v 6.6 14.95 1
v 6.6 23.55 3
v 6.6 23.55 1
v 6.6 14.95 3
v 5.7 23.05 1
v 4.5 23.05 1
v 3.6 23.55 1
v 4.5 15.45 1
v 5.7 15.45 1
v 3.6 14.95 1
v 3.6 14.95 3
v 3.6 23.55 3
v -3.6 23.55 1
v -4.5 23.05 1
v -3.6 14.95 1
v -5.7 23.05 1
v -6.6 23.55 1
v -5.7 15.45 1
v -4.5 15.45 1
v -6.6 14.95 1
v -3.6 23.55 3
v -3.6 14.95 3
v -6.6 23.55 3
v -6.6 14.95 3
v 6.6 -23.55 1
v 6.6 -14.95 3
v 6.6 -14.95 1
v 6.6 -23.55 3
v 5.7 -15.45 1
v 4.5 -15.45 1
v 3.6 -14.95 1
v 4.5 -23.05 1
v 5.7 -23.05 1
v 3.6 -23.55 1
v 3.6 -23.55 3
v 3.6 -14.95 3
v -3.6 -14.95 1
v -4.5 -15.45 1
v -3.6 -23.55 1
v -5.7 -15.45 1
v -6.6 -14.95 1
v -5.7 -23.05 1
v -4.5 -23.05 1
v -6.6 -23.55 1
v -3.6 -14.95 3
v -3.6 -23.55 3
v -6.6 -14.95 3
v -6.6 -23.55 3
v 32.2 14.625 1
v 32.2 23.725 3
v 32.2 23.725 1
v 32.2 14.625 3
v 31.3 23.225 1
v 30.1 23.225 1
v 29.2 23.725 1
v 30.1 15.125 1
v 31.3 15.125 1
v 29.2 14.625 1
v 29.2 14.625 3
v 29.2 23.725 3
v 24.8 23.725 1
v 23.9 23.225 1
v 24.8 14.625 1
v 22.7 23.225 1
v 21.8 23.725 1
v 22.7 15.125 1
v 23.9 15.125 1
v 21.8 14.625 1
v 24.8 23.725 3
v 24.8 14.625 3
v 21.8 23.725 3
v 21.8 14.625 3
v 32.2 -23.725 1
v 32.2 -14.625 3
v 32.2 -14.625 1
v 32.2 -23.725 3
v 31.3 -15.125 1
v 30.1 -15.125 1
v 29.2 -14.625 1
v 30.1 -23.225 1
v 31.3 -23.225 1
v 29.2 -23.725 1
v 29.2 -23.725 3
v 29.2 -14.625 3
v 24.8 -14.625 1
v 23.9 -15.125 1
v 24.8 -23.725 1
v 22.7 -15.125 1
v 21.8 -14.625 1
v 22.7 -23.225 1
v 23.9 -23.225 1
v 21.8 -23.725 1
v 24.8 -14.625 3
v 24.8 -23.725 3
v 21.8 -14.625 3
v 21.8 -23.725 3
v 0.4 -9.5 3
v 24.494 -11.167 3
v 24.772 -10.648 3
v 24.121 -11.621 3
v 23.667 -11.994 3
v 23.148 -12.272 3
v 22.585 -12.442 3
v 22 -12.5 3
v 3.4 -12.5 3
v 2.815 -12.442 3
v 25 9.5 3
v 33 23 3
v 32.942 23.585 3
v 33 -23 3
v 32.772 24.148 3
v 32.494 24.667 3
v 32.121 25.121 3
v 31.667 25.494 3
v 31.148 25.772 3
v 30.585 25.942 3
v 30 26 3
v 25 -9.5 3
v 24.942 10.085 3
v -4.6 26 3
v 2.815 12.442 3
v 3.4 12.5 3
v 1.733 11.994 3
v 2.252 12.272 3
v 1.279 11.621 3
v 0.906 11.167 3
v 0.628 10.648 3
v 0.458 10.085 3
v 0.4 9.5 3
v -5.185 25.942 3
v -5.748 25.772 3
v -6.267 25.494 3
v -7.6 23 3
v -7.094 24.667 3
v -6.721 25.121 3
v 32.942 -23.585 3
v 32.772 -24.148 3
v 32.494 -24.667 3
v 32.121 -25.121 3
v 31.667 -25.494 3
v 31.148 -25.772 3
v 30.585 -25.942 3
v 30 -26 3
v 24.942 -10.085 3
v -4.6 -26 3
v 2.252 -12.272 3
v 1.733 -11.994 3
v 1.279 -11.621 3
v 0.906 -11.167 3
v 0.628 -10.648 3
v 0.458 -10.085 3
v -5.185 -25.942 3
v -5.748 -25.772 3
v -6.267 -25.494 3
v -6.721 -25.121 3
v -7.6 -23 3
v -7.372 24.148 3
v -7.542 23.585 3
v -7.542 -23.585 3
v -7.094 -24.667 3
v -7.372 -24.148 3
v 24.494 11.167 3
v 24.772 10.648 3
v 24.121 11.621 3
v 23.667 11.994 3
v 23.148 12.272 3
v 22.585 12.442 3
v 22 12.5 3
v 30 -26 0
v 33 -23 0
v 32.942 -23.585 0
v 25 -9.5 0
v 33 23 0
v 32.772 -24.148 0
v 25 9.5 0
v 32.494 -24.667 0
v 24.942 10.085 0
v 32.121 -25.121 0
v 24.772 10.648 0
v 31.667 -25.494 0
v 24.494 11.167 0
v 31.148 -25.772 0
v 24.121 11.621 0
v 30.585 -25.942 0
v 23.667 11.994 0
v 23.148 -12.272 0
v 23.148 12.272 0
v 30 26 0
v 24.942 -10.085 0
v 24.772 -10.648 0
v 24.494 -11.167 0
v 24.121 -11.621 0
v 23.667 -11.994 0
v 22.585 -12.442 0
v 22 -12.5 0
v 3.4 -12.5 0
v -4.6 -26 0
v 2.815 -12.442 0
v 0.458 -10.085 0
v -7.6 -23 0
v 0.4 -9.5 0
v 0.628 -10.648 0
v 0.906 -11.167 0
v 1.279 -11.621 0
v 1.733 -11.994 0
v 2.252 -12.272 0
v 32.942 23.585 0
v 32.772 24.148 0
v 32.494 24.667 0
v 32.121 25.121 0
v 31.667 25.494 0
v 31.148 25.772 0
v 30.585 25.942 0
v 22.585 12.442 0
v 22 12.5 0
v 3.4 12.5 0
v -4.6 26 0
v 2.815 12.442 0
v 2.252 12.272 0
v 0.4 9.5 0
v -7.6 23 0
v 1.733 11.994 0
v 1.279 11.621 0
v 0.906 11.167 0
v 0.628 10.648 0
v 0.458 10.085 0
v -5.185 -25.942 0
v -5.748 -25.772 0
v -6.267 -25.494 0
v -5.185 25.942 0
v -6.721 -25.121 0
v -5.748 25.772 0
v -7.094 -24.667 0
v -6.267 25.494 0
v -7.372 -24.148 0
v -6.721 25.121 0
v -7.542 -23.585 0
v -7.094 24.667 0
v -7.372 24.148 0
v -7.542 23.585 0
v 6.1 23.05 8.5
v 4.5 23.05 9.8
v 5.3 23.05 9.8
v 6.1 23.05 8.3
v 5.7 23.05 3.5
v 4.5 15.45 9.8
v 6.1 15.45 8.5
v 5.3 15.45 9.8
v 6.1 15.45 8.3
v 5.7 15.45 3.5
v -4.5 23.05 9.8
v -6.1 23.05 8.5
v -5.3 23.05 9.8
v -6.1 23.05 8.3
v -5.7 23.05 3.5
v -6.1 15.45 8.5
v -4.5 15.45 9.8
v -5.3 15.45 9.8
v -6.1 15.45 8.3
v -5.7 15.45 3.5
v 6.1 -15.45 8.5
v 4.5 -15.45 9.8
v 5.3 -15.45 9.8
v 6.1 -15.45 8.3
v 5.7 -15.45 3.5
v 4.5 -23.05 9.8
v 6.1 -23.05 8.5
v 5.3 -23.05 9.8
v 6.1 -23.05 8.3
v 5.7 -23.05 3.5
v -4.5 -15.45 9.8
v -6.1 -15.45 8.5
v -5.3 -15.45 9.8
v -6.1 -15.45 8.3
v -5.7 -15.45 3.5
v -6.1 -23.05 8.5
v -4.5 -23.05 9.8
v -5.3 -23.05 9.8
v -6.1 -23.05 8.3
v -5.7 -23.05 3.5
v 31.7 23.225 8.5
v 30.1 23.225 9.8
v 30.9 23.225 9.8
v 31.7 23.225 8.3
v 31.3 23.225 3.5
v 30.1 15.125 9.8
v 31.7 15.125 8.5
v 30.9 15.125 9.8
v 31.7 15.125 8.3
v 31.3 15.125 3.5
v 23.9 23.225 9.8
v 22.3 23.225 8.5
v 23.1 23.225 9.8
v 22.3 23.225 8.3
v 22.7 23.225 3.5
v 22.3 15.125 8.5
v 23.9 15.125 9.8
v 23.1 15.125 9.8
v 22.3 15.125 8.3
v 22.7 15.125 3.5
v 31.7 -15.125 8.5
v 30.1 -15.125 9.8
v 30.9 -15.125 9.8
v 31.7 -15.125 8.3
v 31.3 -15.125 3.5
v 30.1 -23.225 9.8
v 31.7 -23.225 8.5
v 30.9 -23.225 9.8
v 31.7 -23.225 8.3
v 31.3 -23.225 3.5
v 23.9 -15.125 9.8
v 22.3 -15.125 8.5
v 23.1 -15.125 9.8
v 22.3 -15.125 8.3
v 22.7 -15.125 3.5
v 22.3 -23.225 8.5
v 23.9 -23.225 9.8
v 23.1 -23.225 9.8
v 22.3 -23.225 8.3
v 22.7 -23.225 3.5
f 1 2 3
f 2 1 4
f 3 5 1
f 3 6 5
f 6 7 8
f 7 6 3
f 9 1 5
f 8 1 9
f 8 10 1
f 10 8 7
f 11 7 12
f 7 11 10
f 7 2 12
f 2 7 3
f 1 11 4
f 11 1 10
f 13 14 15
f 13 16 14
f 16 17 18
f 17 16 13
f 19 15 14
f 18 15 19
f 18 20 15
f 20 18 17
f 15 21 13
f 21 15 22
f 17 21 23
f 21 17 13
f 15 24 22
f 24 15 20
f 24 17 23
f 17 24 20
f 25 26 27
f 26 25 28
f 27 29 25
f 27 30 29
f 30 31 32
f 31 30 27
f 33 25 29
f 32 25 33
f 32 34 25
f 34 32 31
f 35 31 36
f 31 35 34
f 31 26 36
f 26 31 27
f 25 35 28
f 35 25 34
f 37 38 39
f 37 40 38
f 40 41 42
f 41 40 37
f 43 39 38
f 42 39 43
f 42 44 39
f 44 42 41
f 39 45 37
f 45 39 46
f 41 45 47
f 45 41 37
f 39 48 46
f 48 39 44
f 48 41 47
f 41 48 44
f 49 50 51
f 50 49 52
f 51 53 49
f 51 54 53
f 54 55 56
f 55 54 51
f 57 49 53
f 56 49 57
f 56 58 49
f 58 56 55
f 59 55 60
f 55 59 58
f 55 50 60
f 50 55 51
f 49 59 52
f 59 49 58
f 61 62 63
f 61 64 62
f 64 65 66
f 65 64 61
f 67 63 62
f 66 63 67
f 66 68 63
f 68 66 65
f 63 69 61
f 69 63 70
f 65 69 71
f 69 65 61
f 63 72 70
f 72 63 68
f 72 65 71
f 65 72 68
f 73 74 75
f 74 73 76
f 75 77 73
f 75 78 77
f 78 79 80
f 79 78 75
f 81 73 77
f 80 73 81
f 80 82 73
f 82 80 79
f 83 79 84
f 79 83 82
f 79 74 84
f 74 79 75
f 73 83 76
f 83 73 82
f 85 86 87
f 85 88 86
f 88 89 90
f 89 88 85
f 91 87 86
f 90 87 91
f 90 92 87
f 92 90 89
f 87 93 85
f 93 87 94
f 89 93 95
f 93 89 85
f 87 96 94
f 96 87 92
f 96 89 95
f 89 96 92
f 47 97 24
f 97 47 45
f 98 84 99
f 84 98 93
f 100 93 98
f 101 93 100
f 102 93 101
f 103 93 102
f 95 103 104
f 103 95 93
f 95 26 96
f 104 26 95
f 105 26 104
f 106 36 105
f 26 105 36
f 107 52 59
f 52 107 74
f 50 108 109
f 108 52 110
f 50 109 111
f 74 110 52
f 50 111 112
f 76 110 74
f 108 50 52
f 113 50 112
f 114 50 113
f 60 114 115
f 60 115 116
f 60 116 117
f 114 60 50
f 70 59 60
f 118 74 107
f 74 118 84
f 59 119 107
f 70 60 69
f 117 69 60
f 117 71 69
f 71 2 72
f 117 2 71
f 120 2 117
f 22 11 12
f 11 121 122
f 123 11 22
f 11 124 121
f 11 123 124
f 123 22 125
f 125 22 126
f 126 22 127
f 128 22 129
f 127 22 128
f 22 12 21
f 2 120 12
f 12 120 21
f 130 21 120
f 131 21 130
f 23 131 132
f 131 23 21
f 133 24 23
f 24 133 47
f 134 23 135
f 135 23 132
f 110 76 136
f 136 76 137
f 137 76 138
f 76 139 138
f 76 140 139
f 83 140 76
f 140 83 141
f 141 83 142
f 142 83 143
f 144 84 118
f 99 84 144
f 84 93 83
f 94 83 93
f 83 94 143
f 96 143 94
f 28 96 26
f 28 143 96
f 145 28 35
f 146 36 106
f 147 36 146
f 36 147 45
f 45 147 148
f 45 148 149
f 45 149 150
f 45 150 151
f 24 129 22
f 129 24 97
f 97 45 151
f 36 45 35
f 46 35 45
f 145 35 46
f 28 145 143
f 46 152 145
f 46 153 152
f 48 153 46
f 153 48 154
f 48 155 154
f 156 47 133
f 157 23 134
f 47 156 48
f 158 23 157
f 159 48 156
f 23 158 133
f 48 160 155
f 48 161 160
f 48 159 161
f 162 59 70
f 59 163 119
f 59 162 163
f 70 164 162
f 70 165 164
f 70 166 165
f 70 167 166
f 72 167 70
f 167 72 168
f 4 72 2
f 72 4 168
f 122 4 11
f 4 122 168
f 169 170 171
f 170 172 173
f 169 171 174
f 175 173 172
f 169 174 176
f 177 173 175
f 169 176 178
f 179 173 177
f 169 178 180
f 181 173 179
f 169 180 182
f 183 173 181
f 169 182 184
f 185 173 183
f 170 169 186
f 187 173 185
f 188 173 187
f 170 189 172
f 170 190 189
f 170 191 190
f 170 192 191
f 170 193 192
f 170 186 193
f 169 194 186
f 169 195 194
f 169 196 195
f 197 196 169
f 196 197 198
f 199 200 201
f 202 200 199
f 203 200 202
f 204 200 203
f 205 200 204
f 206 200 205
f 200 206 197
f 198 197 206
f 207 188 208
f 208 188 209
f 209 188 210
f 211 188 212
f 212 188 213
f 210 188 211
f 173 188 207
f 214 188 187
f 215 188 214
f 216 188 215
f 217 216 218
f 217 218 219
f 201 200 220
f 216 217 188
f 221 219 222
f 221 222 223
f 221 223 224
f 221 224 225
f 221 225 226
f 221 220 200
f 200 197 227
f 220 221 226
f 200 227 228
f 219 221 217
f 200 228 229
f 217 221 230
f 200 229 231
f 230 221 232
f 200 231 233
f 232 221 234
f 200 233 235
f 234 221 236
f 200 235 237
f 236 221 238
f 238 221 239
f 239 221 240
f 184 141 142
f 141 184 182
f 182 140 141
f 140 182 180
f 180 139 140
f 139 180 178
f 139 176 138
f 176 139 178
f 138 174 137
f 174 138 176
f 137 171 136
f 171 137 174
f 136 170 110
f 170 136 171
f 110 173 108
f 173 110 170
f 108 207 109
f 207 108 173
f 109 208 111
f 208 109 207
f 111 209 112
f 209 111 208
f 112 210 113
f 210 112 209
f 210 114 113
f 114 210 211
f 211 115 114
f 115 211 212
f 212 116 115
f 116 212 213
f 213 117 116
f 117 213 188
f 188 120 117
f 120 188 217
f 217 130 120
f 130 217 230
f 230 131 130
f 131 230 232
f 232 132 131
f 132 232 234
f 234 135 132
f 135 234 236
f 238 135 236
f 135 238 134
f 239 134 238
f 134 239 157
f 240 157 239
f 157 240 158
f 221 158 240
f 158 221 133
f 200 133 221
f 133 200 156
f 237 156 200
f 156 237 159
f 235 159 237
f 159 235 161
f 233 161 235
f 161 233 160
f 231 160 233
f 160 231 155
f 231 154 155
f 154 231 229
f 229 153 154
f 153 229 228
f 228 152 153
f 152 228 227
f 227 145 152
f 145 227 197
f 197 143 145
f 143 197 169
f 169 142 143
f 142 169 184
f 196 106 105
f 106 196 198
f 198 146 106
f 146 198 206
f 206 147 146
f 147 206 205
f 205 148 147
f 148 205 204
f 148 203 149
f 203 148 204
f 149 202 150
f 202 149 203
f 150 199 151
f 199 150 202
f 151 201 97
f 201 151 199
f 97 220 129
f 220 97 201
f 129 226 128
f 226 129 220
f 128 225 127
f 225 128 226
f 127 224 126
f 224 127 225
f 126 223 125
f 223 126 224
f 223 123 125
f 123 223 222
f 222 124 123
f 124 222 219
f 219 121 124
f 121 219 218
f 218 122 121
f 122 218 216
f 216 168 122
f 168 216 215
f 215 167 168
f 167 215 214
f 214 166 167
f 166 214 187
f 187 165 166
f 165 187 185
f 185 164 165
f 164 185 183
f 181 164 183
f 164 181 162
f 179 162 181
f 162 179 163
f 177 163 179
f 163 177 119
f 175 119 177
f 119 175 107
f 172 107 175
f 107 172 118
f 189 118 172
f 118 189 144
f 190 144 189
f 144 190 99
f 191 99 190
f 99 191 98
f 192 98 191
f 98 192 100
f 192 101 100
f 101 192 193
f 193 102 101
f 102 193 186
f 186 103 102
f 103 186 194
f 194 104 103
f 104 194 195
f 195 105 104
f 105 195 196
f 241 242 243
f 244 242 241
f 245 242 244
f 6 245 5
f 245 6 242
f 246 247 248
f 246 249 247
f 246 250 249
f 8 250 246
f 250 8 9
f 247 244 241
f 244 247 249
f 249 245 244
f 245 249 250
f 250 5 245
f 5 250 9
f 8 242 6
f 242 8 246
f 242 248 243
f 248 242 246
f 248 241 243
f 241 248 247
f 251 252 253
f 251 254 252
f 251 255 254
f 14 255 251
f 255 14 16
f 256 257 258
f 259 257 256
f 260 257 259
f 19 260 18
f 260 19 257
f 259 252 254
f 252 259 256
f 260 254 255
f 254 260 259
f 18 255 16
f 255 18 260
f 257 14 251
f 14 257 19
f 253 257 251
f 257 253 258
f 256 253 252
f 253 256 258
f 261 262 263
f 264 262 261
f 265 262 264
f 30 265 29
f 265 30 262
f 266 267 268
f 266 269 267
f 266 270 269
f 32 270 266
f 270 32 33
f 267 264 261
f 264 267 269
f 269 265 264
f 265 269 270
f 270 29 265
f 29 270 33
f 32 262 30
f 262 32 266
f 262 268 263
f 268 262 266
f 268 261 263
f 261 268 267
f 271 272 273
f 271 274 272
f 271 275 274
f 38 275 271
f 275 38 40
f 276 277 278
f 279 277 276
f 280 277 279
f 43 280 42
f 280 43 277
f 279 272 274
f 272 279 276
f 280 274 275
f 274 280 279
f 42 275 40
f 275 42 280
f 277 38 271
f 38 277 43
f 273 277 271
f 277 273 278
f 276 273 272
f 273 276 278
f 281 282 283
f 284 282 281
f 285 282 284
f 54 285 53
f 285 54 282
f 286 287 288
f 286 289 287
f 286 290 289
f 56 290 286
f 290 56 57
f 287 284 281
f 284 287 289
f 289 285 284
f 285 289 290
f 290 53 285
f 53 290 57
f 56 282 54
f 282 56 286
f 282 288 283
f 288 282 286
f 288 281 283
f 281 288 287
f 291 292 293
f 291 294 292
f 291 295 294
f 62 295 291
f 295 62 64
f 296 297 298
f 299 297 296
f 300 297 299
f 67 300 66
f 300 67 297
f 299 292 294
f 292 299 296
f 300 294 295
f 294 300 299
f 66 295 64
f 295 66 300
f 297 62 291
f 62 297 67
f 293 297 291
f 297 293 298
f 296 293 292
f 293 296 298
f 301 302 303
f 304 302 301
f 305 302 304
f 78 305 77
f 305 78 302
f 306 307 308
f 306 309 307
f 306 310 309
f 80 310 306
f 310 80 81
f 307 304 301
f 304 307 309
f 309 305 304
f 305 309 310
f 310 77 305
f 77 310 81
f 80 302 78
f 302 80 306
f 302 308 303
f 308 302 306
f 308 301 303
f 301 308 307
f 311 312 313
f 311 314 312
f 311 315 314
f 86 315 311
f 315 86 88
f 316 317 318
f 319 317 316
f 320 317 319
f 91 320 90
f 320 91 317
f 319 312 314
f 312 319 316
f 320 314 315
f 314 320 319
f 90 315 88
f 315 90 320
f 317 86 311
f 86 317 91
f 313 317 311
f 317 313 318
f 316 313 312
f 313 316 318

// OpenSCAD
// 2026-11-24: covers for the U1's side panels where the two feeders were (they now hang in the dry box).
// SUPERSEDED 2026-11-25 by 2026-11-25_feeder_blank_cover.scad (a snap leg broke on the fit test; the new cover hooks in).
// Kept because the new file uses this file's panel, adapter board and cable mock-up for its views and clash checks.
// Step 1: "fit_test", a thin frame with the four snap legs only. The cover itself comes after the legs fit.
// The panel's pattern on one side is the other side's turned 180 degrees, so one leg layout fits both.
// Legs: each window takes two springy prongs, pushed straight in (no sliding like the feeder's hooks).
// Their outer faces (toward front and rear) widen from the root to a peak, then ramp in at the tip, so the
// window's edge always rides on the slope and the spring pulls the frame toward the panel, whatever the
// wall thickness is up to peak_z (the feeder's hooks spanned 5.0 and 6.7). Each prong starts root_in below the frame's
// face, in a moat, to make it longer and softer. Nothing hangs on the legs; pull to remove.
// Axes: x along the panel toward the printer's rear, y up the panel, z = 0 the panel's face, -z into it.
// Measured (printer, for the feeder insert): wide windows 11.8 x 8.0, 38.5 apart in y; narrow 9.0 x 8.5,
// 38.35 apart; 27.0 between the pairs. Measured 2026-11-24: cable slot 9.6 x 28.7, channel 1.5 deep,
// adapter board with plugs 30 x 28 x 6; "rear to window: 30mm radius round" (read as a 30 radius behind the narrow windows).
// part = "fit_test" (as printed, frame down, legs up) | "view" (MOCK-UP of a hood cover on the side panel, with the
// adapter board and cable; gap = how far the cover is pulled off, cut = true takes the cover's front away). Units mm.
part = "fit_test";

WIN = [   // x centre, y centre, size x, size y
    [ 0,  38.5 / 2,  11.8, 8.0], [ 0, -38.5 / 2,  11.8, 8.0],
    [27,  38.35 / 2,  9.0, 8.5], [27, -38.35 / 2,  9.0, 8.5] ];
clr    = 0.2;    // leg to window, each side
leg_l  = 6.8;    // below the panel's face (the feeder's shorter hooks reached 6.9)
leg_t  = 1.2;    // prong thickness
peak   = 0.4;    // how far the prong's outer face sticks out past its root: 0.2 squeeze per prong
peak_z = 5.3;    // depth of the peak
root_in = 2;     // prong root, this far into the frame
moat   = 0.9;
fr_t   = 3;      // frame thickness
fr_x   = [-7.6, 33]; fr_y = 26;   // stops short of the cable slot in front, just past the round's start behind
bar    = 13.5;   // frame bar along x, over the windows

module prong(w) {   // outer face toward +x; w = [size x, size y]
    xo = w[0] / 2 - clr;
    rotate([90, 0, 0]) translate([0, 0, -(w[1] / 2 - clr)]) linear_extrude(height = w[1] - 2 * clr)
        polygon([[xo - leg_t, fr_t], [xo, fr_t], [xo, -0.5], [xo + peak, -peak_z], [xo + peak, -peak_z - 0.2],
                 [xo - 0.4, -leg_l], [xo - leg_t, -leg_l]]);
}
module legs() for (w = WIN) translate([w[0], w[1], 0]) for (a = [0, 1]) mirror([a, 0, 0])
    intersection() { prong([w[2], w[3]]); translate([-20, -20, -20]) cube([40, 40, 20 + root_in + 0.5]); }
module moats() for (w = WIN) translate([w[0], w[1], 0]) for (a = [0, 1]) mirror([a, 0, 0]) {
    xo = w[2] / 2 - clr;
    translate([xo - leg_t - moat, -w[3] / 2 - 0.3, -1]) cube([leg_t + 2 * moat, w[3] + 0.6, root_in + 1]);
}
module frame() linear_extrude(height = fr_t) difference() {
    offset(r = 3, $fn = 32) offset(delta = -3) translate([fr_x[0], -fr_y]) square([fr_x[1] - fr_x[0], 2 * fr_y]);
    offset(r = 3, $fn = 32) offset(delta = -3) translate([fr_x[0] + 8, -fr_y + bar]) square([fr_x[1] - fr_x[0] - 16, 2 * (fr_y - bar)]);
}
module fit_test() { difference() { frame(); moats(); } legs(); }

// ---------------- mock-up: hood over the openings and the adapter board (not a part to print yet) ----------------
// 2026-11-25, as taped up in the photo: the board sits behind the slot, between the two rows of windows, its
// cable from the slot into its front plug, the ribbon out of its rear plug and around the printer's rear corner.
// Angular: a flat top and flat sides that flare toward the panel, ending at the seam where the rear rounds off.
// The hood is the same above and below y = 0, so one part fits both sides (turn it 180).
gap = 0; cut = false; show_cover = true;
left = true;                                      // show the left side panel, as in the photo
slot_x  = [-7.9 - 9.6, -7.9]; slot_h = 28.7;      // position from the 2026-11-25 photo
chan    = [21, 1.5];                              // height from a photo
rnd     = [38.5, 30];                             // seam, where the rounded rear piece starts (from the ruler photos, +-0.7); radius TO CONFIRM
board   = [24, 28, 6]; plug = 3; bd_c = [18.5, 0];  // body + a plug at each end = 30 along x; 28 between the window rows (29.85)
cov_x   = [-25, 38]; cov_y = 28;                  // base on the panel: over the latch notch in front, to the seam behind
flare   = 3.5;                                    // the flat top is this much smaller all around, so the sides are trapezoids
cov_h   = 9.5; cov_w = 2;                         // off the panel, wall
rib_w   = 16;                                     // ribbon, photo estimate
module fr_at(d, z) translate([cov_x[0] + d, -cov_y + d, z]) cube([cov_x[1] - cov_x[0] - 2 * d, 2 * cov_y - 2 * d, 0.001]);
module frustum(d, h) hull() { fr_at(d, 0); fr_at(d + flare * h / cov_h, h - 0.001); }
module cov_in() { translate([0, 0, -0.5]) frustum(cov_w / cos(atan(flare / cov_h)) - flare * 0.5 / cov_h, cov_h - cov_w + 0.5); }
module panel_body(d = 0) translate([0, 100, 0]) rotate([90, 0, 0]) linear_extrude(height = 200) {   // the panel's solid side, d outward
    translate([-100, -60]) square([100 + rnd[0], 60 + d]);
    translate([rnd[0], -rnd[1]]) circle(r = rnd[1] + d, $fn = 240);
    translate([rnd[0], -60]) square([rnd[1] + d, 60 - rnd[1]]);
}
module cover() {
    difference() {
        frustum(0, cov_h);
        cov_in();
        translate([cov_x[1] - 6, -(rib_w + 2) / 2, -1]) cube([20, rib_w + 2, 1 + 3.5]);      // ribbon out at the rear
    }
    difference() {
        intersection() {
            for (w = WIN) translate([w[0], 0, 0]) mirror([0, w[1] < 0 ? 1 : 0, 0])     // not past the window on the board's side
                translate([-w[2] / 2 - 1.5, abs(w[1]) - w[3] / 2, 0]) cube([w[2] + 3, w[3] + 1.5, cov_h - cov_w + 0.5]);
            frustum(0.5, cov_h);
        }
        moats();
    }
    legs();
}
module panel() color([0.86, 0.86, 0.85]) difference() {
    intersection() { panel_body(0); translate([-60, -70, -25]) cube([125, 140, 30]); }
    translate([-70, -80, -40]) cube([90, 160, 37]);                                   // hollow behind the flat part
    for (w = WIN) translate([w[0] - w[2] / 2, w[1] - w[3] / 2, -9]) cube([w[2], w[3], 10]);
    translate([slot_x[0], -slot_h / 2, -5]) cube([slot_x[1] - slot_x[0], slot_h, 10]);
    translate([slot_x[1], -chan[0] / 2, -chan[1]]) cube([60, chan[0], 5]);
    translate([-22, -25, -1.5]) cube([11.2, 4.2, 5]);
}
module adapter() {
    color([0.15, 0.2, 0.25]) translate([bd_c[0] - board[0] / 2, bd_c[1] - board[1] / 2, 0.5]) cube(board);
    color("white") for (x = [-board[0] / 2 - plug, board[0] / 2]) translate([bd_c[0] + x, bd_c[1] - 9, 1.5]) cube([plug, 18, 4]);
    color("silver") for (y = [-10, 10]) translate([bd_c[0], bd_c[1] + y, 0.5]) cylinder(d = 4, h = board[2] + 0.3, $fn = 32);
}
module path(P, w) for (i = [0 : len(P) - 2]) hull() for (q = [P[i], P[i + 1]]) translate([q[0], -w / 2, q[1]]) rotate([-90, 0, 0]) cylinder(d = 1, h = w, $fn = 12);
module cable() color([0.08, 0.08, 0.08]) {
    path([[-14, -8], [-13.8, 0], [-12.5, 4], [-10, 5.8], [-7, 6], [-4, 5], [bd_c[0] - board[0] / 2 - plug, 3.5]], 10);   // slack pushed back into the slot
    path(concat([[bd_c[0] + board[0] / 2 + plug, 3]], [[rnd[0], 0.8]], [for (a = [5 : 5 : 75]) [rnd[0] + (rnd[1] + 0.7) * sin(a), -rnd[1] + (rnd[1] + 0.7) * cos(a)]]), rib_w);
}
module view() rotate([0, 0, left ? 180 : 0]) {
    panel(); adapter(); cable();
    if (show_cover) translate([0, 0, gap]) color([0.85, 0.1, 0.1]) difference() {
        cover();
        if (cut) translate([-100, -100, 4]) cube([200, 200, 20]);
    }
}
if (part == "view") view();
if (part == "fit_test") translate([0, 0, fr_t]) mirror([0, 0, 1]) fit_test();
